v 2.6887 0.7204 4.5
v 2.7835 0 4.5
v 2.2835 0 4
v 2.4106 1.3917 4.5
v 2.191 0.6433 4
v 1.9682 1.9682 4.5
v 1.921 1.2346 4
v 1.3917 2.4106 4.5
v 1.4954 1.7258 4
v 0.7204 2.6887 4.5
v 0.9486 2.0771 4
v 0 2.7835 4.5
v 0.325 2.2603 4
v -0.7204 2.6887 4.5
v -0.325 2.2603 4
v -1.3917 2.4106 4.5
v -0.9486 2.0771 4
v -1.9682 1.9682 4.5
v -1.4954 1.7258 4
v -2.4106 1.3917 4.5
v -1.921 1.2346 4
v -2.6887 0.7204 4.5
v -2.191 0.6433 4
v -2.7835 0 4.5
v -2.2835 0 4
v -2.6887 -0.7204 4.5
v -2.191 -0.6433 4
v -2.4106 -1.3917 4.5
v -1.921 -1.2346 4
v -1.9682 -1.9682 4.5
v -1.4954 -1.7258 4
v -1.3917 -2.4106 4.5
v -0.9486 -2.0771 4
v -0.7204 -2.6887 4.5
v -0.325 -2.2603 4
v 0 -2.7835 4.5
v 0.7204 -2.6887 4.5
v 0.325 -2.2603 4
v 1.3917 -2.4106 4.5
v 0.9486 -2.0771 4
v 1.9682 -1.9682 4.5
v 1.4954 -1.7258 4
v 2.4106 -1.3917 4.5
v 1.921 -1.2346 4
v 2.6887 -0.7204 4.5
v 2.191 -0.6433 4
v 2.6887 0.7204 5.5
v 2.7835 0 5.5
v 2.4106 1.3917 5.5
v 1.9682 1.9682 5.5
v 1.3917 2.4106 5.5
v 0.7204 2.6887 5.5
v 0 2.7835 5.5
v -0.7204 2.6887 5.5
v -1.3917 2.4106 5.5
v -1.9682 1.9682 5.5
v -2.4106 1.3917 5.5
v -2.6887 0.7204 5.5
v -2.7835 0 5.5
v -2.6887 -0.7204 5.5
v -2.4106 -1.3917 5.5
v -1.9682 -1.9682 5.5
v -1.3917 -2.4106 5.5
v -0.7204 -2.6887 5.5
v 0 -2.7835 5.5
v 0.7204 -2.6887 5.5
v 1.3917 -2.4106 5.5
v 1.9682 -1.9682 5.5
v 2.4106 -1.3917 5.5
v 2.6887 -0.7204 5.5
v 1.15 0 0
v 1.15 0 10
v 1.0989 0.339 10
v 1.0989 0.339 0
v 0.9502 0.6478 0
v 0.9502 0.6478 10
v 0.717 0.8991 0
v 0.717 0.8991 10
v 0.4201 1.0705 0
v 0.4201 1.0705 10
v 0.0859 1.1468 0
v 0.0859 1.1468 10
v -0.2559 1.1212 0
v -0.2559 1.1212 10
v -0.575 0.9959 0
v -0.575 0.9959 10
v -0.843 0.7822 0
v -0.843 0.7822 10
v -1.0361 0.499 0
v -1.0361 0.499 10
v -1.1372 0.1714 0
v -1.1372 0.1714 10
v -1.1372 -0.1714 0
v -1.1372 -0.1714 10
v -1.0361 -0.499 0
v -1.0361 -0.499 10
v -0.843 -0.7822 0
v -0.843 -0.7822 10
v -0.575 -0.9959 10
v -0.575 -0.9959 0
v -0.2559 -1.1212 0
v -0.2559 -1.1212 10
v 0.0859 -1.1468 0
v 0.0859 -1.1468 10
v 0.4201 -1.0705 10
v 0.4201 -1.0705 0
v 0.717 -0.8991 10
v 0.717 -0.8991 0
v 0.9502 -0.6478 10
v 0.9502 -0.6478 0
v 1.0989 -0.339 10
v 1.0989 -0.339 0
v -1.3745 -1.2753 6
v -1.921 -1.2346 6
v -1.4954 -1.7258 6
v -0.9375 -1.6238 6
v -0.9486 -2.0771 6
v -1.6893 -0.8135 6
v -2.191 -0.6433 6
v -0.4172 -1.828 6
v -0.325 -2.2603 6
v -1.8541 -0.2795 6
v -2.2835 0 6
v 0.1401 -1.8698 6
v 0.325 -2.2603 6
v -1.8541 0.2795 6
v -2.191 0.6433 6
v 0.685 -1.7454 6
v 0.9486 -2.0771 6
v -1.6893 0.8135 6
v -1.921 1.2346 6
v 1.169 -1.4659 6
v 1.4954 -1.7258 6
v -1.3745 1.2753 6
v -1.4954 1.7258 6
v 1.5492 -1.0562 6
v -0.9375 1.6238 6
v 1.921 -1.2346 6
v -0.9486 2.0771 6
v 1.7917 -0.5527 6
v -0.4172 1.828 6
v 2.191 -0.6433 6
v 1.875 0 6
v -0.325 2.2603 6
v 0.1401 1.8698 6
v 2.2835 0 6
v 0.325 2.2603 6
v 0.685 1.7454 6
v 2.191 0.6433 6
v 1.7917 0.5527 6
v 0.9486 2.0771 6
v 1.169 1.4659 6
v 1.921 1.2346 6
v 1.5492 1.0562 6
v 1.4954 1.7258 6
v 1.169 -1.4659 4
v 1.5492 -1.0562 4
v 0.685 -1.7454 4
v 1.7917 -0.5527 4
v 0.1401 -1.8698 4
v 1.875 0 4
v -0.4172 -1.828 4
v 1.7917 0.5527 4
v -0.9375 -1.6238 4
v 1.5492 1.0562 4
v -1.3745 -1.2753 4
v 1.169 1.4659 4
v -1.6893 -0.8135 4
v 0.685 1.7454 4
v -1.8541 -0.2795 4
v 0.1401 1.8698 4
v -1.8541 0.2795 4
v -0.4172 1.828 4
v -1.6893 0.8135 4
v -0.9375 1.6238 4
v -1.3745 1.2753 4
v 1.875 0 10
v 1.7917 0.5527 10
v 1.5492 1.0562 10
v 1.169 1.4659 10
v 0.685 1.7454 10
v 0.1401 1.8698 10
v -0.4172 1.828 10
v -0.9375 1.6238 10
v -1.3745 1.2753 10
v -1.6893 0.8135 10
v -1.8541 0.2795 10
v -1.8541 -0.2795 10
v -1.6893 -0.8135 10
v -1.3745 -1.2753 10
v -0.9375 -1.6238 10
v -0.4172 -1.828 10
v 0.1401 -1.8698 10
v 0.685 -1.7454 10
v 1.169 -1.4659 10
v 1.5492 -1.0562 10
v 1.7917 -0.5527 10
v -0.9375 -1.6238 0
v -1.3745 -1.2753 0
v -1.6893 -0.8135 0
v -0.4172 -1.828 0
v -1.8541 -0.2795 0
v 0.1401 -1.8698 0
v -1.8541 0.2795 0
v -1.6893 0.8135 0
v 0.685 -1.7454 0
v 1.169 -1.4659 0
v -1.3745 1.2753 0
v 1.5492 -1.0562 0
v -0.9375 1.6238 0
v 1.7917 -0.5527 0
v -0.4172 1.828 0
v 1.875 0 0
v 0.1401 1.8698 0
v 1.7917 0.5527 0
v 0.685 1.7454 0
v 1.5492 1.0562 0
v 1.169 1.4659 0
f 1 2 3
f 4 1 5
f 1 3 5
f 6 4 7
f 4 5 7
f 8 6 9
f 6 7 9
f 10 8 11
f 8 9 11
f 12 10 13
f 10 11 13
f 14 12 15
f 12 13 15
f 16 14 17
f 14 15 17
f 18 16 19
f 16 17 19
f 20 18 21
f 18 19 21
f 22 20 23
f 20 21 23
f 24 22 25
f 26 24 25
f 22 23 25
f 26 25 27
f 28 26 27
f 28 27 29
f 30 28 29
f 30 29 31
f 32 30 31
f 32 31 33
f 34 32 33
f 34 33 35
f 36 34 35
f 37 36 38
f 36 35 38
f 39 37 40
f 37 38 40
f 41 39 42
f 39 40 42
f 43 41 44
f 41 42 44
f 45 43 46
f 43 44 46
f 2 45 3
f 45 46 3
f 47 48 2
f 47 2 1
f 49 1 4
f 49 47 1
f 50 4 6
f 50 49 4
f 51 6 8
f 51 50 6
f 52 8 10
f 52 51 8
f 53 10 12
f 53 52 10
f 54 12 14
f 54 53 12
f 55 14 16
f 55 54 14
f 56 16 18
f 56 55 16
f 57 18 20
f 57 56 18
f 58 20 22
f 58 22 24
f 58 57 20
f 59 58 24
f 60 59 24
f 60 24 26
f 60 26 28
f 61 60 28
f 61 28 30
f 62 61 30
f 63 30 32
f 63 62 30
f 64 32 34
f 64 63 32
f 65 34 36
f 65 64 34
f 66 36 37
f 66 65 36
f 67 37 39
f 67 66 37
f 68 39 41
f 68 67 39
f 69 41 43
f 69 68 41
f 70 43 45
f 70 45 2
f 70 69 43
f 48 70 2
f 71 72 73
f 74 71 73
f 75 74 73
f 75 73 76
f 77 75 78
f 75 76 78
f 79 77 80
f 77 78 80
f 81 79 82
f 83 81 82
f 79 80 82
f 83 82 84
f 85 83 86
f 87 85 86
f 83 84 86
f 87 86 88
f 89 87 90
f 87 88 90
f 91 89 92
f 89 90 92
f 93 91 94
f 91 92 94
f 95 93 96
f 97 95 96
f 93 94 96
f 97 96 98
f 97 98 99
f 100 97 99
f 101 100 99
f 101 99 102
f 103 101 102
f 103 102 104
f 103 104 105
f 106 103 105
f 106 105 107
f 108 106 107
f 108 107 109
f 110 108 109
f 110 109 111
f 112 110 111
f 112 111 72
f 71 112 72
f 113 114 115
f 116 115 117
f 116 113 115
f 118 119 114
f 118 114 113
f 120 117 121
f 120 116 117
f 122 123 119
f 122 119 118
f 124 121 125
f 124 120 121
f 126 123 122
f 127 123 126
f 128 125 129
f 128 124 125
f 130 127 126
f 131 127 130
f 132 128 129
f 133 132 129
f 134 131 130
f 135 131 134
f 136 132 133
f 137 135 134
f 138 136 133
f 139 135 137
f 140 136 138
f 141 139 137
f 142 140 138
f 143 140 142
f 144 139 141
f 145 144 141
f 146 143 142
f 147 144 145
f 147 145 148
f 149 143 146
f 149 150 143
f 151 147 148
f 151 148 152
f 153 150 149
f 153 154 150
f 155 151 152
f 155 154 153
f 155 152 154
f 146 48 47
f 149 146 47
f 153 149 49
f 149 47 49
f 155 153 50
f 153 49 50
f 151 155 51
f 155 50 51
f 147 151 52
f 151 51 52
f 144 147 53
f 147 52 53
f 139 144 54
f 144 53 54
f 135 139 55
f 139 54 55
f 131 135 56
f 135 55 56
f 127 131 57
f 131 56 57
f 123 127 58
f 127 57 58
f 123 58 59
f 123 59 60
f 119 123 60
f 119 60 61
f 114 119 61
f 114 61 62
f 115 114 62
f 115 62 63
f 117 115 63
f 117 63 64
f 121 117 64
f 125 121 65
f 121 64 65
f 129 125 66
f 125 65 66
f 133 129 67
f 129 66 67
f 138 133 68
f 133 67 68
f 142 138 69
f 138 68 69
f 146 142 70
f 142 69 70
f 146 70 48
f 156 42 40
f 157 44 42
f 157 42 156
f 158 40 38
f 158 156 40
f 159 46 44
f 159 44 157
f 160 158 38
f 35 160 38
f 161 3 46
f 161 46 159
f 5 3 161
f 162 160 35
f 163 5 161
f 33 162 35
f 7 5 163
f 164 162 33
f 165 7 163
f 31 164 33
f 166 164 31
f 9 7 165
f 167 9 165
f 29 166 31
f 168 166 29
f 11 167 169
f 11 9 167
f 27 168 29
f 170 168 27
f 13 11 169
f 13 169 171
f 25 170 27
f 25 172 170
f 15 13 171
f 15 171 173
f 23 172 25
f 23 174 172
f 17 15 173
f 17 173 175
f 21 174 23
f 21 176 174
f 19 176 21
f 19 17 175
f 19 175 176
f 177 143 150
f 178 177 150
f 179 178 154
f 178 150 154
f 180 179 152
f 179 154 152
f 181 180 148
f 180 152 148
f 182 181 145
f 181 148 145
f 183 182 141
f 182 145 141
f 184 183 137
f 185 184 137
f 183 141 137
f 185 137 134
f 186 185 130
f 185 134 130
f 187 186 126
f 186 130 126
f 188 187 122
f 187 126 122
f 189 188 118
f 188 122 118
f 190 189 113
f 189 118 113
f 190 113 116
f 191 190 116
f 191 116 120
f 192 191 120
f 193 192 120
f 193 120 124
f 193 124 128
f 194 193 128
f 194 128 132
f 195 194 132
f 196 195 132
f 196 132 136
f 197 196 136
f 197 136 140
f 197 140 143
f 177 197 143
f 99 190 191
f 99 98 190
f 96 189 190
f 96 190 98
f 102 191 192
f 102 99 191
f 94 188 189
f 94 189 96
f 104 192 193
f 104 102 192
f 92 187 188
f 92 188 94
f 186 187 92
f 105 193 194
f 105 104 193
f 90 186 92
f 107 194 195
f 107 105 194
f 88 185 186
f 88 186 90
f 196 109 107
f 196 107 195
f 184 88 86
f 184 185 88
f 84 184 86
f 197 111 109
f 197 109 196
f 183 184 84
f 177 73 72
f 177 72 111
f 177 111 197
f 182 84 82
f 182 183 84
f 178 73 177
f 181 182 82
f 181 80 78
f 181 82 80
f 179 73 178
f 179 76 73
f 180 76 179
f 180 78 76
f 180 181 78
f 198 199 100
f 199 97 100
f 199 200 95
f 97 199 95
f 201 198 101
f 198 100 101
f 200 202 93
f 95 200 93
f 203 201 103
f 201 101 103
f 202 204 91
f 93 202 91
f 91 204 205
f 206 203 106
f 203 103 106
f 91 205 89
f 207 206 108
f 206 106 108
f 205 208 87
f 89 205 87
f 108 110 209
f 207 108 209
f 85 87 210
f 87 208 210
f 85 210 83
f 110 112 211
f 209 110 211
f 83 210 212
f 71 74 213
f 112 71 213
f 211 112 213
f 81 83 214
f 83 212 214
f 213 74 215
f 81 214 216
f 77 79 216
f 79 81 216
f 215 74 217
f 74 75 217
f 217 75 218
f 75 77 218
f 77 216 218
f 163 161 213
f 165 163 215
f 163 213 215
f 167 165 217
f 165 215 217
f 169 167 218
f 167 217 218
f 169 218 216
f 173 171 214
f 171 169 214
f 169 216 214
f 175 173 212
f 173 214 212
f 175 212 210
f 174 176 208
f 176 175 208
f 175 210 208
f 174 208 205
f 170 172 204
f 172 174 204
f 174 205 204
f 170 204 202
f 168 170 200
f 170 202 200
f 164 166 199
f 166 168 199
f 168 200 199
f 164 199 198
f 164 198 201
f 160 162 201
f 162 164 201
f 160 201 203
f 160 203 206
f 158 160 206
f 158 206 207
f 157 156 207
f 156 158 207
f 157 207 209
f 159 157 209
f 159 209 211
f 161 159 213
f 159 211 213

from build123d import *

# Parameters (mm, degrees)
F0_R     = 1.875
F1_DEPTH = 10
F2_R     = 1.15
F3_DEPTH = 25
F6_SIZE  = 0.5


with BuildPart() as f1:
    # F0 (on Top) → F1 (new body)
    with BuildSketch(Plane.XY):
        Circle(F0_R)
    extrude(amount=F1_DEPTH)

    # F2 (on face) → F3 (cut)
    with BuildSketch(Plane.XY.offset(10)):
        Circle(F2_R)
    extrude(amount=-F3_DEPTH, mode=Mode.SUBTRACT)

    # F4 (on Front) → F5 (revolve)
    with BuildSketch(Plane.XZ):
        Polygon((1.738653, 6), (1.783498, 4), (2.783498, 4), (2.783498, 6), align=None)
    revolve(axis=Axis((0, 0, 3.566666), (0, 0, 1)))

    # F6
    f6_edges = [f1.edges().sort_by_distance(p)[0] for p in [
        (-2.783498, 0, 4),
        (-2.783498, 0, 6),
    ]]
    chamfer(f6_edges, length=F6_SIZE)


solid = f1.part
